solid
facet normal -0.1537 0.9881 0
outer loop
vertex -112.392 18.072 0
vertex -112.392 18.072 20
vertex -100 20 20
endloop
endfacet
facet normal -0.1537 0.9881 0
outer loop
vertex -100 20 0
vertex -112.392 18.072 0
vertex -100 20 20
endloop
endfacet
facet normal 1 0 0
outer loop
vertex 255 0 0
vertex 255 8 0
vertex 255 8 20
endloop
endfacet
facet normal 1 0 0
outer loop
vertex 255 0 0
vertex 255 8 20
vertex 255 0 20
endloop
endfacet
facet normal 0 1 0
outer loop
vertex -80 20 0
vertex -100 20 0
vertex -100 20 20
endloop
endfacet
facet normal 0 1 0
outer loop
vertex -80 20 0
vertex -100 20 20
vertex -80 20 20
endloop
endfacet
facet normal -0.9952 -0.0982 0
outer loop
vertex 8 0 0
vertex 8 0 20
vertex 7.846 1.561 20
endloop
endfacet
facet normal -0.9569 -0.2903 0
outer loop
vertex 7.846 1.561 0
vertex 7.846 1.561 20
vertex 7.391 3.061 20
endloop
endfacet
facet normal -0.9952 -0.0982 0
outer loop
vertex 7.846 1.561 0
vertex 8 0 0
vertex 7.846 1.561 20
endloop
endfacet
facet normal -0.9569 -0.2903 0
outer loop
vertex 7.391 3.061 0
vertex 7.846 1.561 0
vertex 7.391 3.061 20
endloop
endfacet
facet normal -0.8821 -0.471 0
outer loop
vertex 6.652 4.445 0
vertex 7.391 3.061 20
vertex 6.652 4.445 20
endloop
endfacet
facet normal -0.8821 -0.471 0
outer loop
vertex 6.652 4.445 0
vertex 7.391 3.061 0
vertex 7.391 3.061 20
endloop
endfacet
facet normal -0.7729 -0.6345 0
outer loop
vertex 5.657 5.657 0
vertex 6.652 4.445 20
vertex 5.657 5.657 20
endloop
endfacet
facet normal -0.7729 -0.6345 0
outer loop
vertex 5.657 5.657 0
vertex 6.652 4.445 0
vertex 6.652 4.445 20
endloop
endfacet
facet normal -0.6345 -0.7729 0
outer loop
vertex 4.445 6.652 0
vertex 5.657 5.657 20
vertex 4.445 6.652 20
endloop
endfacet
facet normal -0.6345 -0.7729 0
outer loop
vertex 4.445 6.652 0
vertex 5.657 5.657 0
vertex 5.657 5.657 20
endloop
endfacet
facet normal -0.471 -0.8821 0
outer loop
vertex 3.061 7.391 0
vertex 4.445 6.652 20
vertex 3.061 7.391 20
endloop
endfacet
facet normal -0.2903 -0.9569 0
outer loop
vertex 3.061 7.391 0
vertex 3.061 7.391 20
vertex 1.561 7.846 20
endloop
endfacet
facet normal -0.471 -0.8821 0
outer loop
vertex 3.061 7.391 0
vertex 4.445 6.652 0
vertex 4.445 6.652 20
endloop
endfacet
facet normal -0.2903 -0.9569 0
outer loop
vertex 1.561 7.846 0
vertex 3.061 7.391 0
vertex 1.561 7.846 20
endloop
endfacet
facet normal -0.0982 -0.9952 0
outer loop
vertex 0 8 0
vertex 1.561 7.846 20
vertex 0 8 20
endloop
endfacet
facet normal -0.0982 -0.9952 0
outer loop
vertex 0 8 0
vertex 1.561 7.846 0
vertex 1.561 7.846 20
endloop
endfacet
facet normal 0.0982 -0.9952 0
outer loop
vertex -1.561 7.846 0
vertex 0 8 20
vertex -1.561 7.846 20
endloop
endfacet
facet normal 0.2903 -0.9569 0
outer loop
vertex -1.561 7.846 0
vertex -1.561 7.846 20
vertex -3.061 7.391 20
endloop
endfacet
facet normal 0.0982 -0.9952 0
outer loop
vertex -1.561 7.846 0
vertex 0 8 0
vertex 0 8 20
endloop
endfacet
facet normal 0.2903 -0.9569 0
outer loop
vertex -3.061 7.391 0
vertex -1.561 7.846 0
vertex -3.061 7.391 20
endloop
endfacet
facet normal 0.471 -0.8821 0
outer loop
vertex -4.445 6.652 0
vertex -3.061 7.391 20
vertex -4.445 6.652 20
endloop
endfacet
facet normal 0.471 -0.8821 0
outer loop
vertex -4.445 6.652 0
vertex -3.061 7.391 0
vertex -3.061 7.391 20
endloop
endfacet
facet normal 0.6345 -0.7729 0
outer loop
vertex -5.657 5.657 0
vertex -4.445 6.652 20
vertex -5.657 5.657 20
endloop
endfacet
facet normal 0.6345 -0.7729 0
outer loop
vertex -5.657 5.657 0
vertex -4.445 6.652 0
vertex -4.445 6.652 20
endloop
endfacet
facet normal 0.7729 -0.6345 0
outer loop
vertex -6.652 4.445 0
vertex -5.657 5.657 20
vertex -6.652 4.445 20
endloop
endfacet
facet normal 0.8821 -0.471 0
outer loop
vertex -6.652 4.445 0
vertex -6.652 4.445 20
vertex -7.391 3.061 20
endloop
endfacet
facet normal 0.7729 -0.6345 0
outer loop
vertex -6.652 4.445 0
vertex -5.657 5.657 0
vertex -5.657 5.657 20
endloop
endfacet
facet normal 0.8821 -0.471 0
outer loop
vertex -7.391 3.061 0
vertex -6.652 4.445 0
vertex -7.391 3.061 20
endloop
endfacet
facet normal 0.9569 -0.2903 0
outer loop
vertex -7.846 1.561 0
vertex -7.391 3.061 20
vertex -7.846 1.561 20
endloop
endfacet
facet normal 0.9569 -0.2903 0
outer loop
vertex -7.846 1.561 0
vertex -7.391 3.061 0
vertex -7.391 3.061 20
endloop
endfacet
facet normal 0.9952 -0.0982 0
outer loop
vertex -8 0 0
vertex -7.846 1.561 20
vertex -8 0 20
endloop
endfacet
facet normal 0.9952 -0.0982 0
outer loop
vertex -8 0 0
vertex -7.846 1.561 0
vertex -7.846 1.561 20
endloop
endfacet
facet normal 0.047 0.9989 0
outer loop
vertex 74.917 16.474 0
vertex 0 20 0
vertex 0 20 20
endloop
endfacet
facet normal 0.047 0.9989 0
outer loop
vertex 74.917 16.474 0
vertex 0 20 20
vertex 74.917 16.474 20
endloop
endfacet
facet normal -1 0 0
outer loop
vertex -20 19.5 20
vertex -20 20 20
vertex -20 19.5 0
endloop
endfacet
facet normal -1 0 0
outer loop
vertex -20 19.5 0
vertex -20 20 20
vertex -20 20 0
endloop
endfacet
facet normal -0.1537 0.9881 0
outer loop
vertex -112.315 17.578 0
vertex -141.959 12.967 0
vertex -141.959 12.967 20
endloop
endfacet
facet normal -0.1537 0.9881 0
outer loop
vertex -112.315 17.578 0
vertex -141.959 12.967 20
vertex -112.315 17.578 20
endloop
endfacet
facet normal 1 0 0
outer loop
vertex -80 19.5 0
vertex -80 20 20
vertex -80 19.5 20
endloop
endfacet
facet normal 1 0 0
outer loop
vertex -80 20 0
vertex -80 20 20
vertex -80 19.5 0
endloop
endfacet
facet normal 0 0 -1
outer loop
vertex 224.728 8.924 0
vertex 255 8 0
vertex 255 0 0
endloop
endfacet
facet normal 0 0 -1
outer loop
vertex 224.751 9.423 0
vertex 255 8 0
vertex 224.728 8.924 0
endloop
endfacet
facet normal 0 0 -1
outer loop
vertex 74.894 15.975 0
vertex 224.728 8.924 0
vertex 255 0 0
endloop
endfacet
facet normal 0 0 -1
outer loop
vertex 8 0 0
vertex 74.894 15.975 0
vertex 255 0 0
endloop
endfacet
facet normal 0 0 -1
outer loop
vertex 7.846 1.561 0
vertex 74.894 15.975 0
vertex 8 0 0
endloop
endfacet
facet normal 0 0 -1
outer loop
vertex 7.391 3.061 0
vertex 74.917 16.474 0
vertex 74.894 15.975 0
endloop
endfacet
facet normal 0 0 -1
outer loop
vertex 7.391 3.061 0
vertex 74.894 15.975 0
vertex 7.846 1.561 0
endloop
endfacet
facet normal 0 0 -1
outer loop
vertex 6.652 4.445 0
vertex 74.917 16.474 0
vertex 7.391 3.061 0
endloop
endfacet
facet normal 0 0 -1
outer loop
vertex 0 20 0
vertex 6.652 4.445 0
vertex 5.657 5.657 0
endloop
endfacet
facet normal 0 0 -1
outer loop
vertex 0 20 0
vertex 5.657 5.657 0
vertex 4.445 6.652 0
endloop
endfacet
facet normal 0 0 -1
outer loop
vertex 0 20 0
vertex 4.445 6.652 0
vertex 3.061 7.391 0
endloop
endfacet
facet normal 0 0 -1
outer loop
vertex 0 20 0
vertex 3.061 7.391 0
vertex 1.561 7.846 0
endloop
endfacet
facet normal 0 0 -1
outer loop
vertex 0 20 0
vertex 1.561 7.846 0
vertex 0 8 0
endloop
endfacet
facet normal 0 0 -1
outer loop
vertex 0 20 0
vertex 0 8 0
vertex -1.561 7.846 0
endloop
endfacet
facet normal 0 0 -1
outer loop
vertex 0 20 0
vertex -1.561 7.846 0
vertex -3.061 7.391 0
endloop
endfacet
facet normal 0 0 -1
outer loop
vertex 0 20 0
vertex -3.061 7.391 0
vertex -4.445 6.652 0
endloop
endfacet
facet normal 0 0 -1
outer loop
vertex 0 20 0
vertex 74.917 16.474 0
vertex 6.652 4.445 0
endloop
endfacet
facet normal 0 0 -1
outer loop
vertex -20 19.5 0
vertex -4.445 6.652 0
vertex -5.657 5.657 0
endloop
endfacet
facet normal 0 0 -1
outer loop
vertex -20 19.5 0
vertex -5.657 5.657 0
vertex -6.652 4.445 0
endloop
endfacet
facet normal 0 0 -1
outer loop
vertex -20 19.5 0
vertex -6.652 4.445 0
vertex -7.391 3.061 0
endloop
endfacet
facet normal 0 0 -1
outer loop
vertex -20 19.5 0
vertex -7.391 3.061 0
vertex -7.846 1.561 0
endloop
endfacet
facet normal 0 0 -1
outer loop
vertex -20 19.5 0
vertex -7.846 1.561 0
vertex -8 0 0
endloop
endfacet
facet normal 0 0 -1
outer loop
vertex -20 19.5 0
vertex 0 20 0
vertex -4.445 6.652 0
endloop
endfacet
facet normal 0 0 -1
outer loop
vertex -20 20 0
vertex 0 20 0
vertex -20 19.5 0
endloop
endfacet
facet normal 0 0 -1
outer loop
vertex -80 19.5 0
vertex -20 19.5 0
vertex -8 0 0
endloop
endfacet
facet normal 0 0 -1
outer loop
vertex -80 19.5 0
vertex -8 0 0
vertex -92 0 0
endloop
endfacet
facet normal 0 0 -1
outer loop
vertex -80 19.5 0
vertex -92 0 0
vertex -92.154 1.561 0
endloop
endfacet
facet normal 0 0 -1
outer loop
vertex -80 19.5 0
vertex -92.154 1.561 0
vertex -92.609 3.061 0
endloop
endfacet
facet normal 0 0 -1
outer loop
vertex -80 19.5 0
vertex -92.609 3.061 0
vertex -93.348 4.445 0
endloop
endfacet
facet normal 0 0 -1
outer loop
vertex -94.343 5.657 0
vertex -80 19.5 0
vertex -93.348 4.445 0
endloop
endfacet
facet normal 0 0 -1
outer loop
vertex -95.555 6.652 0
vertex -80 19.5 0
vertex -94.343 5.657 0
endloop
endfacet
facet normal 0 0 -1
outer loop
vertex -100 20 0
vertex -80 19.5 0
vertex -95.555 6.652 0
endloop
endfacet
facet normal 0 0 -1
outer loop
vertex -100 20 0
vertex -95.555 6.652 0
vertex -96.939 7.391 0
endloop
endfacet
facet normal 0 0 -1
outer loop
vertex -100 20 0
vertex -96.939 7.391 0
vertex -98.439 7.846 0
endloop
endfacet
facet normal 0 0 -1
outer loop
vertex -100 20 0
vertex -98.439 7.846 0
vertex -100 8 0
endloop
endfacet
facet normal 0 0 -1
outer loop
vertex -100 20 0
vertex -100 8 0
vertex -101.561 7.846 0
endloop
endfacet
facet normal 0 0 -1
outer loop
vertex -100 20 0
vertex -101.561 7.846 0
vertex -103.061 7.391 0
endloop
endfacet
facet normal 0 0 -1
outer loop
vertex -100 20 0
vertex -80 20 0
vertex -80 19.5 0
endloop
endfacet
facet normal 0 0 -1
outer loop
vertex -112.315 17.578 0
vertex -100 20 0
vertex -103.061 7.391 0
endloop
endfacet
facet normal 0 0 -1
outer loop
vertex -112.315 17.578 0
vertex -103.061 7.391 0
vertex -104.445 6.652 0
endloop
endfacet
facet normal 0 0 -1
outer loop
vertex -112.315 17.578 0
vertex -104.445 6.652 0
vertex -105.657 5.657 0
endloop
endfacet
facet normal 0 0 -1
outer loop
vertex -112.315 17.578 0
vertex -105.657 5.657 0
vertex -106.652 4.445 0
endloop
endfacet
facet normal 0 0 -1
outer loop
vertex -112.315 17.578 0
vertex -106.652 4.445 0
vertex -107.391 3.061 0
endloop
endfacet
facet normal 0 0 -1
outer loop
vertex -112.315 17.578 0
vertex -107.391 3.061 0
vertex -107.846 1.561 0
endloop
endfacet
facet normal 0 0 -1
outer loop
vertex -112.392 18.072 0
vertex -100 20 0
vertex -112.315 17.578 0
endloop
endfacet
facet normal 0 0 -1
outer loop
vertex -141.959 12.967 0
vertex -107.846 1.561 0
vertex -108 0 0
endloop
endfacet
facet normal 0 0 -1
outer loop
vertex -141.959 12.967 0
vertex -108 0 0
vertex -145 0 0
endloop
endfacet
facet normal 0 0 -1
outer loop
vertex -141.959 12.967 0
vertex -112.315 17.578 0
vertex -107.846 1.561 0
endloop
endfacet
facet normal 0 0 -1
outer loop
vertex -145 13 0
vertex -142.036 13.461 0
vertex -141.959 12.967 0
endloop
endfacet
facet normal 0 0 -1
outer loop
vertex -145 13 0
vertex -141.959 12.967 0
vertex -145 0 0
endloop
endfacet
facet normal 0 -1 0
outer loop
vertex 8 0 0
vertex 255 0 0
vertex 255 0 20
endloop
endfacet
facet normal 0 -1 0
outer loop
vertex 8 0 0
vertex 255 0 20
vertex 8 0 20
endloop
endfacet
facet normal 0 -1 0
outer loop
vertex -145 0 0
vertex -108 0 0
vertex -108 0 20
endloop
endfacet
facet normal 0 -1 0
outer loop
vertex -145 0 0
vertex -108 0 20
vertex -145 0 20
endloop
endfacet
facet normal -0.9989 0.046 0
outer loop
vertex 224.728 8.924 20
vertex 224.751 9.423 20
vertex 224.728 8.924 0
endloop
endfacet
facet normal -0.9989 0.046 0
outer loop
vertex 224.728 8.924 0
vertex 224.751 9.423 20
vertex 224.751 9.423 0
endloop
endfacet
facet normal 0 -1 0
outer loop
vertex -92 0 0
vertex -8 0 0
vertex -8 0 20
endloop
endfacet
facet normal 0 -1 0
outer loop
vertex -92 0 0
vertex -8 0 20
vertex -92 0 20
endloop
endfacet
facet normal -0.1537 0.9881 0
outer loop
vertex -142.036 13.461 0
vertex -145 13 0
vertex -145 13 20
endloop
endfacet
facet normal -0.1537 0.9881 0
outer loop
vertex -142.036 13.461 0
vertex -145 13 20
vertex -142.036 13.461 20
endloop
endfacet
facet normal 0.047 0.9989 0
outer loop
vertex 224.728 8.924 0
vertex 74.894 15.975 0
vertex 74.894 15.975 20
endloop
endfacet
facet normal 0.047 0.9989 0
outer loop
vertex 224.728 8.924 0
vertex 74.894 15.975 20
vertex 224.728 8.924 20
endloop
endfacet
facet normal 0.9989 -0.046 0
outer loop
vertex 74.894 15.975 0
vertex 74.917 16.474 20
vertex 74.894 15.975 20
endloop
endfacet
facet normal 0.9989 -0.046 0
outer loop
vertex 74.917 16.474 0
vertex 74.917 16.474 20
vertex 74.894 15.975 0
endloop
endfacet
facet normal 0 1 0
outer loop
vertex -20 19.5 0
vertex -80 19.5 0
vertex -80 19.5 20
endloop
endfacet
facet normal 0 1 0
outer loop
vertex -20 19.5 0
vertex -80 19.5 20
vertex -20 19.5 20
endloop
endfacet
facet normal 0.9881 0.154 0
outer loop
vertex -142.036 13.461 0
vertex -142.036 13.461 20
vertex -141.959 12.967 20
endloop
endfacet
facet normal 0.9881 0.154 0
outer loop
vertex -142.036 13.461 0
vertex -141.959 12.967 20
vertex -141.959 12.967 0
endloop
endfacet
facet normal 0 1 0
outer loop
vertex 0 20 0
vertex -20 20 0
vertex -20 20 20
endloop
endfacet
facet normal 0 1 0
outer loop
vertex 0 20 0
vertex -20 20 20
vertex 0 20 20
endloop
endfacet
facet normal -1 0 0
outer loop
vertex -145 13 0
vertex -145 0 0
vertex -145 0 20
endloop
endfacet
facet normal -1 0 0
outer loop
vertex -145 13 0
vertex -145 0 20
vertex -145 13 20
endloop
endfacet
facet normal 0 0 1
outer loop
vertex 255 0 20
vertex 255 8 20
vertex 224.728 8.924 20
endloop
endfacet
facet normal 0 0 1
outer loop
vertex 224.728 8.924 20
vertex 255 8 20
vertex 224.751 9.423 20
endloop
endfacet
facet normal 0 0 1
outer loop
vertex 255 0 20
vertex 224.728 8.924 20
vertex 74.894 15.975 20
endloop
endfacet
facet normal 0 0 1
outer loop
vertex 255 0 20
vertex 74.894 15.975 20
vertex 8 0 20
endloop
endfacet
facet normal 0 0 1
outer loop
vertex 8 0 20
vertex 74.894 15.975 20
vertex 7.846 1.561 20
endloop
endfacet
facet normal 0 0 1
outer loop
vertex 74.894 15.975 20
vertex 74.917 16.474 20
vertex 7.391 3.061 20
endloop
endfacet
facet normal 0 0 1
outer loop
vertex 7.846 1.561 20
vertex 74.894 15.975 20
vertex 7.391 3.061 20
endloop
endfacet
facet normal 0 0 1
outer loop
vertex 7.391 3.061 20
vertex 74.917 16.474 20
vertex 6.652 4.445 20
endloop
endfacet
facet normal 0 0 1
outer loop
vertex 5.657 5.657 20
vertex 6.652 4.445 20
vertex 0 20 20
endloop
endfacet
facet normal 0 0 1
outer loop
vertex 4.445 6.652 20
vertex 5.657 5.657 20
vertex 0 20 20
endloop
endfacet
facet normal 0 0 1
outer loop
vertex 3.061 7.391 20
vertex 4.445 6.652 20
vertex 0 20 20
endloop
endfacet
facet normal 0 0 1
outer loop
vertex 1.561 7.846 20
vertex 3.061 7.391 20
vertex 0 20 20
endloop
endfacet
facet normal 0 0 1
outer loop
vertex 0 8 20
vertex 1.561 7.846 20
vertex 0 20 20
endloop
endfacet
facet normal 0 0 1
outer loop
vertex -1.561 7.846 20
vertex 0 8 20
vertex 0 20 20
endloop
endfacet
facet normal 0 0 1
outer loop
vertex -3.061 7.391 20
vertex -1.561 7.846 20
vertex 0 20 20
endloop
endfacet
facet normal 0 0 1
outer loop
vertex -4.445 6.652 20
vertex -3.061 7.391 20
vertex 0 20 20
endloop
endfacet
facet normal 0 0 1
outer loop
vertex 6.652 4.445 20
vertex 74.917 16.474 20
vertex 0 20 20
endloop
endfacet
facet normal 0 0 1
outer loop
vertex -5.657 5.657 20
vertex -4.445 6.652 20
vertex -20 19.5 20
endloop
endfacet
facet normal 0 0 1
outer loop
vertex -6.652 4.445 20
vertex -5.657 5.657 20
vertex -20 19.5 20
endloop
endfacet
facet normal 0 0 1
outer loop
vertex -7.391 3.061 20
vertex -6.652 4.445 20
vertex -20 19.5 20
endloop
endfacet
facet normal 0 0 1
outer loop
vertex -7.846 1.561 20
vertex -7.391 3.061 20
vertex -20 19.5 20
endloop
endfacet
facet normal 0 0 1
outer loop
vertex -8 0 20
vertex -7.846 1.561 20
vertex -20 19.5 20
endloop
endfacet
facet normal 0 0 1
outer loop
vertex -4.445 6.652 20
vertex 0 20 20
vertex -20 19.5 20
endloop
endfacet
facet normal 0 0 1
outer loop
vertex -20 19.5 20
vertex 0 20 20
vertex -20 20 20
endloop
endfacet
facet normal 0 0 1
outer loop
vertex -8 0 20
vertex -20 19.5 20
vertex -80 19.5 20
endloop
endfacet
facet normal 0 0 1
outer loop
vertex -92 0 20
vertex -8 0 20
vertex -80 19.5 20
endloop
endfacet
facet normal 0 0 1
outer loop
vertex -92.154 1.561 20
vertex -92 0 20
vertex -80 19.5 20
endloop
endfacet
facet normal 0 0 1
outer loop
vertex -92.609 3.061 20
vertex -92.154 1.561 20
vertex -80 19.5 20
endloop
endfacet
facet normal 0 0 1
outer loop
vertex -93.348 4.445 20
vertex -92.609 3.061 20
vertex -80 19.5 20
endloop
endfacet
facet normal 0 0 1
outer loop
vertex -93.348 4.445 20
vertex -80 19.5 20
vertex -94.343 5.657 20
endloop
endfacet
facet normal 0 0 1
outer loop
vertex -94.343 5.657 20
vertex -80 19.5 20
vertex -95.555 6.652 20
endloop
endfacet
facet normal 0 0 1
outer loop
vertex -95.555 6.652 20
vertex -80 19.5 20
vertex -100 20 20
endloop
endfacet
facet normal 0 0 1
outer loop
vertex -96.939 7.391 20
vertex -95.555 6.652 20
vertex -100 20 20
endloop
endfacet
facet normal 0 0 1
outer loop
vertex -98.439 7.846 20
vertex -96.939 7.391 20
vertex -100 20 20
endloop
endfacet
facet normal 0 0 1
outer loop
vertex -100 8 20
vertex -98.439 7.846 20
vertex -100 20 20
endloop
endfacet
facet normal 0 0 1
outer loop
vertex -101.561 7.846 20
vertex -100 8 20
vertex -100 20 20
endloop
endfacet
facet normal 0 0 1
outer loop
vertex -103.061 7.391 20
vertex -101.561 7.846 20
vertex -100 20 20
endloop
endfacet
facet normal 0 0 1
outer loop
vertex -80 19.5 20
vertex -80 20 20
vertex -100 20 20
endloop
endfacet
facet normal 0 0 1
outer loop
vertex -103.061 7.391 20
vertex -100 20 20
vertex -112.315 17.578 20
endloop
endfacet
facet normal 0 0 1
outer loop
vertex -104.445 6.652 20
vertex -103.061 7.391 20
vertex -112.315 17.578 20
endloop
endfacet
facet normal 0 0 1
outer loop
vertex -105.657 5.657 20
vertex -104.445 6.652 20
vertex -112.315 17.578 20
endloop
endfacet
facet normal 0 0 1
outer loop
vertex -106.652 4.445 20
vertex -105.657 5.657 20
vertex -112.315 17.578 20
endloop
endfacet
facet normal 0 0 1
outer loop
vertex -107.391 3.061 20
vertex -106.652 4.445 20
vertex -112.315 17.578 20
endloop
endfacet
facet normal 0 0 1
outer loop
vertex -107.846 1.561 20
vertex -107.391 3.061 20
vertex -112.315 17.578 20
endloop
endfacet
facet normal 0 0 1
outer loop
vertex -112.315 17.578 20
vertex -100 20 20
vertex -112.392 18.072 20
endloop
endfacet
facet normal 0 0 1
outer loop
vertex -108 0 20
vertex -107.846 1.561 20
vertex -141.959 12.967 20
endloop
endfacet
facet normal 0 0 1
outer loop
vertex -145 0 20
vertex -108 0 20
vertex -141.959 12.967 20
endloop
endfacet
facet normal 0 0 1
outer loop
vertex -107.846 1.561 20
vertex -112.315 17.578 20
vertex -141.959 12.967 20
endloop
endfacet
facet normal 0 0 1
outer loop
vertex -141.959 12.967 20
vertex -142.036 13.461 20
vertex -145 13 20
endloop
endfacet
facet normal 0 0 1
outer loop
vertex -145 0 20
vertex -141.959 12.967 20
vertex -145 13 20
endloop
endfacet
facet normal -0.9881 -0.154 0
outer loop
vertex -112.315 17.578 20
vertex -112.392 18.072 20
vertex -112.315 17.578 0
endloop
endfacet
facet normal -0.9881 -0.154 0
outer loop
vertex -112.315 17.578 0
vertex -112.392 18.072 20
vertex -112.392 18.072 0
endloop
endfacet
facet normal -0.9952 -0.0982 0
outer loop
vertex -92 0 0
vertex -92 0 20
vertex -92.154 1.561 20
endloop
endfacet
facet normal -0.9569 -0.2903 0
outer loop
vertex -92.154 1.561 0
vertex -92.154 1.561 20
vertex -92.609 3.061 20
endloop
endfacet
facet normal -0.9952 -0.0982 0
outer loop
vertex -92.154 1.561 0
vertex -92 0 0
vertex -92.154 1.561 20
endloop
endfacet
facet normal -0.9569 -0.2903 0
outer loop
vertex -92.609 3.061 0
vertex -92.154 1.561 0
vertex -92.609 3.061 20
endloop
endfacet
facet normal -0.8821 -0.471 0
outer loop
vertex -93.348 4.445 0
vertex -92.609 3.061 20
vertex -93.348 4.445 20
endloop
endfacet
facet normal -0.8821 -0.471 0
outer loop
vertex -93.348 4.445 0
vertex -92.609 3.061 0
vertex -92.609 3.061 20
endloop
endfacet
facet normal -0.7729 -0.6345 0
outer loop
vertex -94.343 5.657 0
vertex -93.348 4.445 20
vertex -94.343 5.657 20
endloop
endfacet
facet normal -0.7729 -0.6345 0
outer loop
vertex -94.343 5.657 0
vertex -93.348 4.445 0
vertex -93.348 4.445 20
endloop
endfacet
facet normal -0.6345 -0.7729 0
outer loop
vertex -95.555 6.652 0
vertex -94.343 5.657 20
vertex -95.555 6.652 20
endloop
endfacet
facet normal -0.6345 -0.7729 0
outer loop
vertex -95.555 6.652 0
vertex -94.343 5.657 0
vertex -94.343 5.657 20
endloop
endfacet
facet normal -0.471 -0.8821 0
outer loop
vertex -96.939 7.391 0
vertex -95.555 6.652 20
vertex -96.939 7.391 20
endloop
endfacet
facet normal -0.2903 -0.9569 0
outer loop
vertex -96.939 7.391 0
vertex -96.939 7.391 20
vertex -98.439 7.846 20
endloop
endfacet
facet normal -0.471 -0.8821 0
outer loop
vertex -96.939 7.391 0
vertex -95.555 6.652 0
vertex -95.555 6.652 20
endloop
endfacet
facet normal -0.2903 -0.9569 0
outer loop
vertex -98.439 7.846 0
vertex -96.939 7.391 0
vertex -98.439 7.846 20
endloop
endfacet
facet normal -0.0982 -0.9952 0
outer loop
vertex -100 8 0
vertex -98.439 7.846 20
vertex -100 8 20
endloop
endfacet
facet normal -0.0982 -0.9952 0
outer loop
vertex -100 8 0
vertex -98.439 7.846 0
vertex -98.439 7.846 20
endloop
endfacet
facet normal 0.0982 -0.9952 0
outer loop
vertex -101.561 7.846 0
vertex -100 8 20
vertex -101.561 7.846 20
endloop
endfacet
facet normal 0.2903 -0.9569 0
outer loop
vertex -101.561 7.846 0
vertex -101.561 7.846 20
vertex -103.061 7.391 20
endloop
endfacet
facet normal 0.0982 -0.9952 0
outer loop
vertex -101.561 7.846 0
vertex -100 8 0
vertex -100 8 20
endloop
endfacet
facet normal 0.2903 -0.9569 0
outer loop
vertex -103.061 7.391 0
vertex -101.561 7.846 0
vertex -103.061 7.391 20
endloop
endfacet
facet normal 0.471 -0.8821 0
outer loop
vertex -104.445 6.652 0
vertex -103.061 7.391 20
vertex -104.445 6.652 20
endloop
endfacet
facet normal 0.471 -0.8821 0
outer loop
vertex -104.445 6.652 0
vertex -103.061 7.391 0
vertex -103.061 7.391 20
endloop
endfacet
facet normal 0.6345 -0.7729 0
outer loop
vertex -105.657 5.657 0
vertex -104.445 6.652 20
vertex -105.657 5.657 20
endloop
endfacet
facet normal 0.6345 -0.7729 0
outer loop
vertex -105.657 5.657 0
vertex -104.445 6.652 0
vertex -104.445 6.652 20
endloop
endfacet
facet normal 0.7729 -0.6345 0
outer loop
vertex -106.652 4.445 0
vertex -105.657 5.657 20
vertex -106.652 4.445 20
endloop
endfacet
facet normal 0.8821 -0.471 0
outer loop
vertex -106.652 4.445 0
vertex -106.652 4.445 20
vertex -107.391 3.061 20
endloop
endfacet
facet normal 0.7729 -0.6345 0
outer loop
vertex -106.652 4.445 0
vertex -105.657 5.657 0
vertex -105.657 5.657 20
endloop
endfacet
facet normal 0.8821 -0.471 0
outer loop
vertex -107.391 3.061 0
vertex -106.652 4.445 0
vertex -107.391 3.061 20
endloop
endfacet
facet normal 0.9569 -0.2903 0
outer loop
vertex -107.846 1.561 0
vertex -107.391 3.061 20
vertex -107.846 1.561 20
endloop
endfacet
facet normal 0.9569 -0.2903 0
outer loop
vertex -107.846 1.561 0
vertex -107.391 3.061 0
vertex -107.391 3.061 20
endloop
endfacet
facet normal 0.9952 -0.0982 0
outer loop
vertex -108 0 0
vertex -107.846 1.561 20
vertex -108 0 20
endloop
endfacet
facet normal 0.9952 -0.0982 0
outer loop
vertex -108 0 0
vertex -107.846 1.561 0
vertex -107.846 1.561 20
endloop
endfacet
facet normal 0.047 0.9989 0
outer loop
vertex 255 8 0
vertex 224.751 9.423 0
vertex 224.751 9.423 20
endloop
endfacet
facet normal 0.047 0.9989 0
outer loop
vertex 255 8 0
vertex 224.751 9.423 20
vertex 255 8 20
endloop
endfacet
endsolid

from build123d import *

# Parameters (mm, degrees)
BOSS_EXTRUDE1_DEPTH = 20
SKETCH2_W           = 150
SKETCH2_H           = 20
ROPEGROOVE1_DEPTH   = 0.5
SKETCH4_W           = 60
SKETCH4_H           = 20
ROPEGROOVE2_DEPTH   = 0.5
SKETCH5_W           = 30
SKETCH5_H           = 20
ROPEGROOVE3_DEPTH   = 0.5


with BuildPart() as part:
    # Sketch1 → Boss-Extrude1 (new body)
    with BuildSketch(Plane.XY):
        with BuildLine():
            Line((-8, 0), (-92, 0))
            ThreePointArc((-92, 0), (-100, 8), (-108, 0))
            Line((-108, 0), (-145, 0))
            Line((-145, 0), (-145, 13))
            Line((-145, 13), (-100, 20))
            Line((-100, 20), (0, 20))
            Line((0, 20), (255, 8))
            Line((255, 8), (255, 0))
            Line((255, 0), (8, 0))
            ThreePointArc((8, 0), (0, 8), (-8, 0))
        make_face()
    extrude(amount=BOSS_EXTRUDE1_DEPTH)

    # Sketch2 → RopeGroove1 (cut)
    with BuildSketch(Plane(origin=(0.93909681, 19.955807209, 0), x_dir=(0.9988945692351382, -0.047006803258124105, 0), z_dir=(0.047006803258124105, 0.9988945692351382, 0))):
        with Locations((149.059863935, -10)):
            Rectangle(SKETCH2_W, SKETCH2_H)
    extrude(amount=-ROPEGROOVE1_DEPTH, mode=Mode.SUBTRACT)

    # Sketch4 → RopeGroove2 (cut)
    with BuildSketch(Plane(origin=(0, 20, 0), x_dir=(1, 0, 0), z_dir=(0, 1, 0))):
        with Locations((-50, -10)):
            Rectangle(SKETCH4_W, SKETCH4_H)
    extrude(amount=-ROPEGROOVE2_DEPTH, mode=Mode.SUBTRACT)

    # Sketch5 → RopeGroove3 (cut)
    with BuildSketch(Plane(origin=(-5.400192864, 34.715525554, 0), x_dir=(0.9881164689548824, 0.15370700628187053, 0), z_dir=(-0.15370700628187053, 0.9881164689548824, 0))):
        with Locations((-123.278696917, -10)):
            Rectangle(SKETCH5_W, SKETCH5_H)
    extrude(amount=-ROPEGROOVE3_DEPTH, mode=Mode.SUBTRACT)


solid = part.part
